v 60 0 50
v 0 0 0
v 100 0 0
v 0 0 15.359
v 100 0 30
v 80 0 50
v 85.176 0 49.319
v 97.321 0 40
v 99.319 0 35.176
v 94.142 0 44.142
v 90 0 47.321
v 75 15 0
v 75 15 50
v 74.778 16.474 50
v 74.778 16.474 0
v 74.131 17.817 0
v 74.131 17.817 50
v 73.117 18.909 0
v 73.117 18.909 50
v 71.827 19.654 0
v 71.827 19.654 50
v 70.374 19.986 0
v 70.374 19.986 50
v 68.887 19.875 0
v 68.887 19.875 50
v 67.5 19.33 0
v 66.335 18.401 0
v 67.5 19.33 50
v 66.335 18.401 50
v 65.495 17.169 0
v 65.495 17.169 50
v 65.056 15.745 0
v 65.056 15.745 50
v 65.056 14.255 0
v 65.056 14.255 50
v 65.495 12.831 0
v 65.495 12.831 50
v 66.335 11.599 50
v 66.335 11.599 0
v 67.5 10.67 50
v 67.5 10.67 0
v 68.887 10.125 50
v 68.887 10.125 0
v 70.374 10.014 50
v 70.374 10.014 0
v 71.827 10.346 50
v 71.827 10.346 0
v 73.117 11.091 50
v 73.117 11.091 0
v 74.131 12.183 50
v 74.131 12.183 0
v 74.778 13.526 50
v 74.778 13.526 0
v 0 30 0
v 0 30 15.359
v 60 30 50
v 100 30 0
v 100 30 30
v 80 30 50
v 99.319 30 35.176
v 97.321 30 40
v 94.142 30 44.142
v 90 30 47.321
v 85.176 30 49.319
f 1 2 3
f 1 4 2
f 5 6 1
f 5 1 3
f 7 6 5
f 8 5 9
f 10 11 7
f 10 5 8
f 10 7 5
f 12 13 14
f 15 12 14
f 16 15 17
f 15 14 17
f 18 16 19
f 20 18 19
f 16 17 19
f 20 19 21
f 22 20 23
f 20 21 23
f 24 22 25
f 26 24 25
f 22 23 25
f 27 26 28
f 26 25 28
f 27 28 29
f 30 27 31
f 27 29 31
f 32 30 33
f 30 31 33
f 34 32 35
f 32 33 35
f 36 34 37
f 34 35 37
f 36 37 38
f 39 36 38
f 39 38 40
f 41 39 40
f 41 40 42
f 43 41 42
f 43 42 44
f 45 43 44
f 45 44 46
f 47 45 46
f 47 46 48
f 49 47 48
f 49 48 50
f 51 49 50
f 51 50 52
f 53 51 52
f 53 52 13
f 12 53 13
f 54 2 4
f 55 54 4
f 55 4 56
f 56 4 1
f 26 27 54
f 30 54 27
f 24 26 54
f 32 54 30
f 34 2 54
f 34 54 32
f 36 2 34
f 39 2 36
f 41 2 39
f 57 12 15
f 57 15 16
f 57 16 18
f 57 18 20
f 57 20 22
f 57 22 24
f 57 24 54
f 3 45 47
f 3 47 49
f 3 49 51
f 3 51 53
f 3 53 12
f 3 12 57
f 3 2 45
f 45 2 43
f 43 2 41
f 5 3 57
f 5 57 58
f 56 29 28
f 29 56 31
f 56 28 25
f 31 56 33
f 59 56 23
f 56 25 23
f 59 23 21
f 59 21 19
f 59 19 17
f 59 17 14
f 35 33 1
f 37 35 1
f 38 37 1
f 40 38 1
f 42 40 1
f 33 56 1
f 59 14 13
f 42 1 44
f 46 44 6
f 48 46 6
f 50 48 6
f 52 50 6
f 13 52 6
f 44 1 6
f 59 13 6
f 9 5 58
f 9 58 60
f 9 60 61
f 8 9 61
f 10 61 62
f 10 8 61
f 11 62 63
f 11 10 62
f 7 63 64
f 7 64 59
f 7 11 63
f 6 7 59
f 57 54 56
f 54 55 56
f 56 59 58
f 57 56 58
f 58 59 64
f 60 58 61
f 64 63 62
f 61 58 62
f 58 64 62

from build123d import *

# Parameters (mm, degrees)
PAD_DEPTH    = 30
SKETCH001_R  = 5
POCKET_DEPTH = 50.001


with BuildPart() as part:
    # Sketch → Pad (new body)
    with BuildSketch(Plane.XZ):
        with BuildLine():
            Line((0, 0), (100, 0))
            Line((100, 0), (100, 30))
            ThreePointArc((100, 30), (94.142136, 44.142136), (80, 50))
            Line((60, 50), (80, 50))
            Line((0, 15.358984), (60, 50))
            Line((0, 0), (0, 15.358984))
        make_face()
    extrude(amount=-PAD_DEPTH)

    # Sketch001 (on DatumPlane) → Pocket (cut, through all)
    with BuildSketch(Plane(origin=(70, 15, 50), x_dir=(1, 0, 0), z_dir=(0, 0, 1))):
        Circle(SKETCH001_R)
    extrude(amount=-POCKET_DEPTH, mode=Mode.SUBTRACT)


solid = part.part
